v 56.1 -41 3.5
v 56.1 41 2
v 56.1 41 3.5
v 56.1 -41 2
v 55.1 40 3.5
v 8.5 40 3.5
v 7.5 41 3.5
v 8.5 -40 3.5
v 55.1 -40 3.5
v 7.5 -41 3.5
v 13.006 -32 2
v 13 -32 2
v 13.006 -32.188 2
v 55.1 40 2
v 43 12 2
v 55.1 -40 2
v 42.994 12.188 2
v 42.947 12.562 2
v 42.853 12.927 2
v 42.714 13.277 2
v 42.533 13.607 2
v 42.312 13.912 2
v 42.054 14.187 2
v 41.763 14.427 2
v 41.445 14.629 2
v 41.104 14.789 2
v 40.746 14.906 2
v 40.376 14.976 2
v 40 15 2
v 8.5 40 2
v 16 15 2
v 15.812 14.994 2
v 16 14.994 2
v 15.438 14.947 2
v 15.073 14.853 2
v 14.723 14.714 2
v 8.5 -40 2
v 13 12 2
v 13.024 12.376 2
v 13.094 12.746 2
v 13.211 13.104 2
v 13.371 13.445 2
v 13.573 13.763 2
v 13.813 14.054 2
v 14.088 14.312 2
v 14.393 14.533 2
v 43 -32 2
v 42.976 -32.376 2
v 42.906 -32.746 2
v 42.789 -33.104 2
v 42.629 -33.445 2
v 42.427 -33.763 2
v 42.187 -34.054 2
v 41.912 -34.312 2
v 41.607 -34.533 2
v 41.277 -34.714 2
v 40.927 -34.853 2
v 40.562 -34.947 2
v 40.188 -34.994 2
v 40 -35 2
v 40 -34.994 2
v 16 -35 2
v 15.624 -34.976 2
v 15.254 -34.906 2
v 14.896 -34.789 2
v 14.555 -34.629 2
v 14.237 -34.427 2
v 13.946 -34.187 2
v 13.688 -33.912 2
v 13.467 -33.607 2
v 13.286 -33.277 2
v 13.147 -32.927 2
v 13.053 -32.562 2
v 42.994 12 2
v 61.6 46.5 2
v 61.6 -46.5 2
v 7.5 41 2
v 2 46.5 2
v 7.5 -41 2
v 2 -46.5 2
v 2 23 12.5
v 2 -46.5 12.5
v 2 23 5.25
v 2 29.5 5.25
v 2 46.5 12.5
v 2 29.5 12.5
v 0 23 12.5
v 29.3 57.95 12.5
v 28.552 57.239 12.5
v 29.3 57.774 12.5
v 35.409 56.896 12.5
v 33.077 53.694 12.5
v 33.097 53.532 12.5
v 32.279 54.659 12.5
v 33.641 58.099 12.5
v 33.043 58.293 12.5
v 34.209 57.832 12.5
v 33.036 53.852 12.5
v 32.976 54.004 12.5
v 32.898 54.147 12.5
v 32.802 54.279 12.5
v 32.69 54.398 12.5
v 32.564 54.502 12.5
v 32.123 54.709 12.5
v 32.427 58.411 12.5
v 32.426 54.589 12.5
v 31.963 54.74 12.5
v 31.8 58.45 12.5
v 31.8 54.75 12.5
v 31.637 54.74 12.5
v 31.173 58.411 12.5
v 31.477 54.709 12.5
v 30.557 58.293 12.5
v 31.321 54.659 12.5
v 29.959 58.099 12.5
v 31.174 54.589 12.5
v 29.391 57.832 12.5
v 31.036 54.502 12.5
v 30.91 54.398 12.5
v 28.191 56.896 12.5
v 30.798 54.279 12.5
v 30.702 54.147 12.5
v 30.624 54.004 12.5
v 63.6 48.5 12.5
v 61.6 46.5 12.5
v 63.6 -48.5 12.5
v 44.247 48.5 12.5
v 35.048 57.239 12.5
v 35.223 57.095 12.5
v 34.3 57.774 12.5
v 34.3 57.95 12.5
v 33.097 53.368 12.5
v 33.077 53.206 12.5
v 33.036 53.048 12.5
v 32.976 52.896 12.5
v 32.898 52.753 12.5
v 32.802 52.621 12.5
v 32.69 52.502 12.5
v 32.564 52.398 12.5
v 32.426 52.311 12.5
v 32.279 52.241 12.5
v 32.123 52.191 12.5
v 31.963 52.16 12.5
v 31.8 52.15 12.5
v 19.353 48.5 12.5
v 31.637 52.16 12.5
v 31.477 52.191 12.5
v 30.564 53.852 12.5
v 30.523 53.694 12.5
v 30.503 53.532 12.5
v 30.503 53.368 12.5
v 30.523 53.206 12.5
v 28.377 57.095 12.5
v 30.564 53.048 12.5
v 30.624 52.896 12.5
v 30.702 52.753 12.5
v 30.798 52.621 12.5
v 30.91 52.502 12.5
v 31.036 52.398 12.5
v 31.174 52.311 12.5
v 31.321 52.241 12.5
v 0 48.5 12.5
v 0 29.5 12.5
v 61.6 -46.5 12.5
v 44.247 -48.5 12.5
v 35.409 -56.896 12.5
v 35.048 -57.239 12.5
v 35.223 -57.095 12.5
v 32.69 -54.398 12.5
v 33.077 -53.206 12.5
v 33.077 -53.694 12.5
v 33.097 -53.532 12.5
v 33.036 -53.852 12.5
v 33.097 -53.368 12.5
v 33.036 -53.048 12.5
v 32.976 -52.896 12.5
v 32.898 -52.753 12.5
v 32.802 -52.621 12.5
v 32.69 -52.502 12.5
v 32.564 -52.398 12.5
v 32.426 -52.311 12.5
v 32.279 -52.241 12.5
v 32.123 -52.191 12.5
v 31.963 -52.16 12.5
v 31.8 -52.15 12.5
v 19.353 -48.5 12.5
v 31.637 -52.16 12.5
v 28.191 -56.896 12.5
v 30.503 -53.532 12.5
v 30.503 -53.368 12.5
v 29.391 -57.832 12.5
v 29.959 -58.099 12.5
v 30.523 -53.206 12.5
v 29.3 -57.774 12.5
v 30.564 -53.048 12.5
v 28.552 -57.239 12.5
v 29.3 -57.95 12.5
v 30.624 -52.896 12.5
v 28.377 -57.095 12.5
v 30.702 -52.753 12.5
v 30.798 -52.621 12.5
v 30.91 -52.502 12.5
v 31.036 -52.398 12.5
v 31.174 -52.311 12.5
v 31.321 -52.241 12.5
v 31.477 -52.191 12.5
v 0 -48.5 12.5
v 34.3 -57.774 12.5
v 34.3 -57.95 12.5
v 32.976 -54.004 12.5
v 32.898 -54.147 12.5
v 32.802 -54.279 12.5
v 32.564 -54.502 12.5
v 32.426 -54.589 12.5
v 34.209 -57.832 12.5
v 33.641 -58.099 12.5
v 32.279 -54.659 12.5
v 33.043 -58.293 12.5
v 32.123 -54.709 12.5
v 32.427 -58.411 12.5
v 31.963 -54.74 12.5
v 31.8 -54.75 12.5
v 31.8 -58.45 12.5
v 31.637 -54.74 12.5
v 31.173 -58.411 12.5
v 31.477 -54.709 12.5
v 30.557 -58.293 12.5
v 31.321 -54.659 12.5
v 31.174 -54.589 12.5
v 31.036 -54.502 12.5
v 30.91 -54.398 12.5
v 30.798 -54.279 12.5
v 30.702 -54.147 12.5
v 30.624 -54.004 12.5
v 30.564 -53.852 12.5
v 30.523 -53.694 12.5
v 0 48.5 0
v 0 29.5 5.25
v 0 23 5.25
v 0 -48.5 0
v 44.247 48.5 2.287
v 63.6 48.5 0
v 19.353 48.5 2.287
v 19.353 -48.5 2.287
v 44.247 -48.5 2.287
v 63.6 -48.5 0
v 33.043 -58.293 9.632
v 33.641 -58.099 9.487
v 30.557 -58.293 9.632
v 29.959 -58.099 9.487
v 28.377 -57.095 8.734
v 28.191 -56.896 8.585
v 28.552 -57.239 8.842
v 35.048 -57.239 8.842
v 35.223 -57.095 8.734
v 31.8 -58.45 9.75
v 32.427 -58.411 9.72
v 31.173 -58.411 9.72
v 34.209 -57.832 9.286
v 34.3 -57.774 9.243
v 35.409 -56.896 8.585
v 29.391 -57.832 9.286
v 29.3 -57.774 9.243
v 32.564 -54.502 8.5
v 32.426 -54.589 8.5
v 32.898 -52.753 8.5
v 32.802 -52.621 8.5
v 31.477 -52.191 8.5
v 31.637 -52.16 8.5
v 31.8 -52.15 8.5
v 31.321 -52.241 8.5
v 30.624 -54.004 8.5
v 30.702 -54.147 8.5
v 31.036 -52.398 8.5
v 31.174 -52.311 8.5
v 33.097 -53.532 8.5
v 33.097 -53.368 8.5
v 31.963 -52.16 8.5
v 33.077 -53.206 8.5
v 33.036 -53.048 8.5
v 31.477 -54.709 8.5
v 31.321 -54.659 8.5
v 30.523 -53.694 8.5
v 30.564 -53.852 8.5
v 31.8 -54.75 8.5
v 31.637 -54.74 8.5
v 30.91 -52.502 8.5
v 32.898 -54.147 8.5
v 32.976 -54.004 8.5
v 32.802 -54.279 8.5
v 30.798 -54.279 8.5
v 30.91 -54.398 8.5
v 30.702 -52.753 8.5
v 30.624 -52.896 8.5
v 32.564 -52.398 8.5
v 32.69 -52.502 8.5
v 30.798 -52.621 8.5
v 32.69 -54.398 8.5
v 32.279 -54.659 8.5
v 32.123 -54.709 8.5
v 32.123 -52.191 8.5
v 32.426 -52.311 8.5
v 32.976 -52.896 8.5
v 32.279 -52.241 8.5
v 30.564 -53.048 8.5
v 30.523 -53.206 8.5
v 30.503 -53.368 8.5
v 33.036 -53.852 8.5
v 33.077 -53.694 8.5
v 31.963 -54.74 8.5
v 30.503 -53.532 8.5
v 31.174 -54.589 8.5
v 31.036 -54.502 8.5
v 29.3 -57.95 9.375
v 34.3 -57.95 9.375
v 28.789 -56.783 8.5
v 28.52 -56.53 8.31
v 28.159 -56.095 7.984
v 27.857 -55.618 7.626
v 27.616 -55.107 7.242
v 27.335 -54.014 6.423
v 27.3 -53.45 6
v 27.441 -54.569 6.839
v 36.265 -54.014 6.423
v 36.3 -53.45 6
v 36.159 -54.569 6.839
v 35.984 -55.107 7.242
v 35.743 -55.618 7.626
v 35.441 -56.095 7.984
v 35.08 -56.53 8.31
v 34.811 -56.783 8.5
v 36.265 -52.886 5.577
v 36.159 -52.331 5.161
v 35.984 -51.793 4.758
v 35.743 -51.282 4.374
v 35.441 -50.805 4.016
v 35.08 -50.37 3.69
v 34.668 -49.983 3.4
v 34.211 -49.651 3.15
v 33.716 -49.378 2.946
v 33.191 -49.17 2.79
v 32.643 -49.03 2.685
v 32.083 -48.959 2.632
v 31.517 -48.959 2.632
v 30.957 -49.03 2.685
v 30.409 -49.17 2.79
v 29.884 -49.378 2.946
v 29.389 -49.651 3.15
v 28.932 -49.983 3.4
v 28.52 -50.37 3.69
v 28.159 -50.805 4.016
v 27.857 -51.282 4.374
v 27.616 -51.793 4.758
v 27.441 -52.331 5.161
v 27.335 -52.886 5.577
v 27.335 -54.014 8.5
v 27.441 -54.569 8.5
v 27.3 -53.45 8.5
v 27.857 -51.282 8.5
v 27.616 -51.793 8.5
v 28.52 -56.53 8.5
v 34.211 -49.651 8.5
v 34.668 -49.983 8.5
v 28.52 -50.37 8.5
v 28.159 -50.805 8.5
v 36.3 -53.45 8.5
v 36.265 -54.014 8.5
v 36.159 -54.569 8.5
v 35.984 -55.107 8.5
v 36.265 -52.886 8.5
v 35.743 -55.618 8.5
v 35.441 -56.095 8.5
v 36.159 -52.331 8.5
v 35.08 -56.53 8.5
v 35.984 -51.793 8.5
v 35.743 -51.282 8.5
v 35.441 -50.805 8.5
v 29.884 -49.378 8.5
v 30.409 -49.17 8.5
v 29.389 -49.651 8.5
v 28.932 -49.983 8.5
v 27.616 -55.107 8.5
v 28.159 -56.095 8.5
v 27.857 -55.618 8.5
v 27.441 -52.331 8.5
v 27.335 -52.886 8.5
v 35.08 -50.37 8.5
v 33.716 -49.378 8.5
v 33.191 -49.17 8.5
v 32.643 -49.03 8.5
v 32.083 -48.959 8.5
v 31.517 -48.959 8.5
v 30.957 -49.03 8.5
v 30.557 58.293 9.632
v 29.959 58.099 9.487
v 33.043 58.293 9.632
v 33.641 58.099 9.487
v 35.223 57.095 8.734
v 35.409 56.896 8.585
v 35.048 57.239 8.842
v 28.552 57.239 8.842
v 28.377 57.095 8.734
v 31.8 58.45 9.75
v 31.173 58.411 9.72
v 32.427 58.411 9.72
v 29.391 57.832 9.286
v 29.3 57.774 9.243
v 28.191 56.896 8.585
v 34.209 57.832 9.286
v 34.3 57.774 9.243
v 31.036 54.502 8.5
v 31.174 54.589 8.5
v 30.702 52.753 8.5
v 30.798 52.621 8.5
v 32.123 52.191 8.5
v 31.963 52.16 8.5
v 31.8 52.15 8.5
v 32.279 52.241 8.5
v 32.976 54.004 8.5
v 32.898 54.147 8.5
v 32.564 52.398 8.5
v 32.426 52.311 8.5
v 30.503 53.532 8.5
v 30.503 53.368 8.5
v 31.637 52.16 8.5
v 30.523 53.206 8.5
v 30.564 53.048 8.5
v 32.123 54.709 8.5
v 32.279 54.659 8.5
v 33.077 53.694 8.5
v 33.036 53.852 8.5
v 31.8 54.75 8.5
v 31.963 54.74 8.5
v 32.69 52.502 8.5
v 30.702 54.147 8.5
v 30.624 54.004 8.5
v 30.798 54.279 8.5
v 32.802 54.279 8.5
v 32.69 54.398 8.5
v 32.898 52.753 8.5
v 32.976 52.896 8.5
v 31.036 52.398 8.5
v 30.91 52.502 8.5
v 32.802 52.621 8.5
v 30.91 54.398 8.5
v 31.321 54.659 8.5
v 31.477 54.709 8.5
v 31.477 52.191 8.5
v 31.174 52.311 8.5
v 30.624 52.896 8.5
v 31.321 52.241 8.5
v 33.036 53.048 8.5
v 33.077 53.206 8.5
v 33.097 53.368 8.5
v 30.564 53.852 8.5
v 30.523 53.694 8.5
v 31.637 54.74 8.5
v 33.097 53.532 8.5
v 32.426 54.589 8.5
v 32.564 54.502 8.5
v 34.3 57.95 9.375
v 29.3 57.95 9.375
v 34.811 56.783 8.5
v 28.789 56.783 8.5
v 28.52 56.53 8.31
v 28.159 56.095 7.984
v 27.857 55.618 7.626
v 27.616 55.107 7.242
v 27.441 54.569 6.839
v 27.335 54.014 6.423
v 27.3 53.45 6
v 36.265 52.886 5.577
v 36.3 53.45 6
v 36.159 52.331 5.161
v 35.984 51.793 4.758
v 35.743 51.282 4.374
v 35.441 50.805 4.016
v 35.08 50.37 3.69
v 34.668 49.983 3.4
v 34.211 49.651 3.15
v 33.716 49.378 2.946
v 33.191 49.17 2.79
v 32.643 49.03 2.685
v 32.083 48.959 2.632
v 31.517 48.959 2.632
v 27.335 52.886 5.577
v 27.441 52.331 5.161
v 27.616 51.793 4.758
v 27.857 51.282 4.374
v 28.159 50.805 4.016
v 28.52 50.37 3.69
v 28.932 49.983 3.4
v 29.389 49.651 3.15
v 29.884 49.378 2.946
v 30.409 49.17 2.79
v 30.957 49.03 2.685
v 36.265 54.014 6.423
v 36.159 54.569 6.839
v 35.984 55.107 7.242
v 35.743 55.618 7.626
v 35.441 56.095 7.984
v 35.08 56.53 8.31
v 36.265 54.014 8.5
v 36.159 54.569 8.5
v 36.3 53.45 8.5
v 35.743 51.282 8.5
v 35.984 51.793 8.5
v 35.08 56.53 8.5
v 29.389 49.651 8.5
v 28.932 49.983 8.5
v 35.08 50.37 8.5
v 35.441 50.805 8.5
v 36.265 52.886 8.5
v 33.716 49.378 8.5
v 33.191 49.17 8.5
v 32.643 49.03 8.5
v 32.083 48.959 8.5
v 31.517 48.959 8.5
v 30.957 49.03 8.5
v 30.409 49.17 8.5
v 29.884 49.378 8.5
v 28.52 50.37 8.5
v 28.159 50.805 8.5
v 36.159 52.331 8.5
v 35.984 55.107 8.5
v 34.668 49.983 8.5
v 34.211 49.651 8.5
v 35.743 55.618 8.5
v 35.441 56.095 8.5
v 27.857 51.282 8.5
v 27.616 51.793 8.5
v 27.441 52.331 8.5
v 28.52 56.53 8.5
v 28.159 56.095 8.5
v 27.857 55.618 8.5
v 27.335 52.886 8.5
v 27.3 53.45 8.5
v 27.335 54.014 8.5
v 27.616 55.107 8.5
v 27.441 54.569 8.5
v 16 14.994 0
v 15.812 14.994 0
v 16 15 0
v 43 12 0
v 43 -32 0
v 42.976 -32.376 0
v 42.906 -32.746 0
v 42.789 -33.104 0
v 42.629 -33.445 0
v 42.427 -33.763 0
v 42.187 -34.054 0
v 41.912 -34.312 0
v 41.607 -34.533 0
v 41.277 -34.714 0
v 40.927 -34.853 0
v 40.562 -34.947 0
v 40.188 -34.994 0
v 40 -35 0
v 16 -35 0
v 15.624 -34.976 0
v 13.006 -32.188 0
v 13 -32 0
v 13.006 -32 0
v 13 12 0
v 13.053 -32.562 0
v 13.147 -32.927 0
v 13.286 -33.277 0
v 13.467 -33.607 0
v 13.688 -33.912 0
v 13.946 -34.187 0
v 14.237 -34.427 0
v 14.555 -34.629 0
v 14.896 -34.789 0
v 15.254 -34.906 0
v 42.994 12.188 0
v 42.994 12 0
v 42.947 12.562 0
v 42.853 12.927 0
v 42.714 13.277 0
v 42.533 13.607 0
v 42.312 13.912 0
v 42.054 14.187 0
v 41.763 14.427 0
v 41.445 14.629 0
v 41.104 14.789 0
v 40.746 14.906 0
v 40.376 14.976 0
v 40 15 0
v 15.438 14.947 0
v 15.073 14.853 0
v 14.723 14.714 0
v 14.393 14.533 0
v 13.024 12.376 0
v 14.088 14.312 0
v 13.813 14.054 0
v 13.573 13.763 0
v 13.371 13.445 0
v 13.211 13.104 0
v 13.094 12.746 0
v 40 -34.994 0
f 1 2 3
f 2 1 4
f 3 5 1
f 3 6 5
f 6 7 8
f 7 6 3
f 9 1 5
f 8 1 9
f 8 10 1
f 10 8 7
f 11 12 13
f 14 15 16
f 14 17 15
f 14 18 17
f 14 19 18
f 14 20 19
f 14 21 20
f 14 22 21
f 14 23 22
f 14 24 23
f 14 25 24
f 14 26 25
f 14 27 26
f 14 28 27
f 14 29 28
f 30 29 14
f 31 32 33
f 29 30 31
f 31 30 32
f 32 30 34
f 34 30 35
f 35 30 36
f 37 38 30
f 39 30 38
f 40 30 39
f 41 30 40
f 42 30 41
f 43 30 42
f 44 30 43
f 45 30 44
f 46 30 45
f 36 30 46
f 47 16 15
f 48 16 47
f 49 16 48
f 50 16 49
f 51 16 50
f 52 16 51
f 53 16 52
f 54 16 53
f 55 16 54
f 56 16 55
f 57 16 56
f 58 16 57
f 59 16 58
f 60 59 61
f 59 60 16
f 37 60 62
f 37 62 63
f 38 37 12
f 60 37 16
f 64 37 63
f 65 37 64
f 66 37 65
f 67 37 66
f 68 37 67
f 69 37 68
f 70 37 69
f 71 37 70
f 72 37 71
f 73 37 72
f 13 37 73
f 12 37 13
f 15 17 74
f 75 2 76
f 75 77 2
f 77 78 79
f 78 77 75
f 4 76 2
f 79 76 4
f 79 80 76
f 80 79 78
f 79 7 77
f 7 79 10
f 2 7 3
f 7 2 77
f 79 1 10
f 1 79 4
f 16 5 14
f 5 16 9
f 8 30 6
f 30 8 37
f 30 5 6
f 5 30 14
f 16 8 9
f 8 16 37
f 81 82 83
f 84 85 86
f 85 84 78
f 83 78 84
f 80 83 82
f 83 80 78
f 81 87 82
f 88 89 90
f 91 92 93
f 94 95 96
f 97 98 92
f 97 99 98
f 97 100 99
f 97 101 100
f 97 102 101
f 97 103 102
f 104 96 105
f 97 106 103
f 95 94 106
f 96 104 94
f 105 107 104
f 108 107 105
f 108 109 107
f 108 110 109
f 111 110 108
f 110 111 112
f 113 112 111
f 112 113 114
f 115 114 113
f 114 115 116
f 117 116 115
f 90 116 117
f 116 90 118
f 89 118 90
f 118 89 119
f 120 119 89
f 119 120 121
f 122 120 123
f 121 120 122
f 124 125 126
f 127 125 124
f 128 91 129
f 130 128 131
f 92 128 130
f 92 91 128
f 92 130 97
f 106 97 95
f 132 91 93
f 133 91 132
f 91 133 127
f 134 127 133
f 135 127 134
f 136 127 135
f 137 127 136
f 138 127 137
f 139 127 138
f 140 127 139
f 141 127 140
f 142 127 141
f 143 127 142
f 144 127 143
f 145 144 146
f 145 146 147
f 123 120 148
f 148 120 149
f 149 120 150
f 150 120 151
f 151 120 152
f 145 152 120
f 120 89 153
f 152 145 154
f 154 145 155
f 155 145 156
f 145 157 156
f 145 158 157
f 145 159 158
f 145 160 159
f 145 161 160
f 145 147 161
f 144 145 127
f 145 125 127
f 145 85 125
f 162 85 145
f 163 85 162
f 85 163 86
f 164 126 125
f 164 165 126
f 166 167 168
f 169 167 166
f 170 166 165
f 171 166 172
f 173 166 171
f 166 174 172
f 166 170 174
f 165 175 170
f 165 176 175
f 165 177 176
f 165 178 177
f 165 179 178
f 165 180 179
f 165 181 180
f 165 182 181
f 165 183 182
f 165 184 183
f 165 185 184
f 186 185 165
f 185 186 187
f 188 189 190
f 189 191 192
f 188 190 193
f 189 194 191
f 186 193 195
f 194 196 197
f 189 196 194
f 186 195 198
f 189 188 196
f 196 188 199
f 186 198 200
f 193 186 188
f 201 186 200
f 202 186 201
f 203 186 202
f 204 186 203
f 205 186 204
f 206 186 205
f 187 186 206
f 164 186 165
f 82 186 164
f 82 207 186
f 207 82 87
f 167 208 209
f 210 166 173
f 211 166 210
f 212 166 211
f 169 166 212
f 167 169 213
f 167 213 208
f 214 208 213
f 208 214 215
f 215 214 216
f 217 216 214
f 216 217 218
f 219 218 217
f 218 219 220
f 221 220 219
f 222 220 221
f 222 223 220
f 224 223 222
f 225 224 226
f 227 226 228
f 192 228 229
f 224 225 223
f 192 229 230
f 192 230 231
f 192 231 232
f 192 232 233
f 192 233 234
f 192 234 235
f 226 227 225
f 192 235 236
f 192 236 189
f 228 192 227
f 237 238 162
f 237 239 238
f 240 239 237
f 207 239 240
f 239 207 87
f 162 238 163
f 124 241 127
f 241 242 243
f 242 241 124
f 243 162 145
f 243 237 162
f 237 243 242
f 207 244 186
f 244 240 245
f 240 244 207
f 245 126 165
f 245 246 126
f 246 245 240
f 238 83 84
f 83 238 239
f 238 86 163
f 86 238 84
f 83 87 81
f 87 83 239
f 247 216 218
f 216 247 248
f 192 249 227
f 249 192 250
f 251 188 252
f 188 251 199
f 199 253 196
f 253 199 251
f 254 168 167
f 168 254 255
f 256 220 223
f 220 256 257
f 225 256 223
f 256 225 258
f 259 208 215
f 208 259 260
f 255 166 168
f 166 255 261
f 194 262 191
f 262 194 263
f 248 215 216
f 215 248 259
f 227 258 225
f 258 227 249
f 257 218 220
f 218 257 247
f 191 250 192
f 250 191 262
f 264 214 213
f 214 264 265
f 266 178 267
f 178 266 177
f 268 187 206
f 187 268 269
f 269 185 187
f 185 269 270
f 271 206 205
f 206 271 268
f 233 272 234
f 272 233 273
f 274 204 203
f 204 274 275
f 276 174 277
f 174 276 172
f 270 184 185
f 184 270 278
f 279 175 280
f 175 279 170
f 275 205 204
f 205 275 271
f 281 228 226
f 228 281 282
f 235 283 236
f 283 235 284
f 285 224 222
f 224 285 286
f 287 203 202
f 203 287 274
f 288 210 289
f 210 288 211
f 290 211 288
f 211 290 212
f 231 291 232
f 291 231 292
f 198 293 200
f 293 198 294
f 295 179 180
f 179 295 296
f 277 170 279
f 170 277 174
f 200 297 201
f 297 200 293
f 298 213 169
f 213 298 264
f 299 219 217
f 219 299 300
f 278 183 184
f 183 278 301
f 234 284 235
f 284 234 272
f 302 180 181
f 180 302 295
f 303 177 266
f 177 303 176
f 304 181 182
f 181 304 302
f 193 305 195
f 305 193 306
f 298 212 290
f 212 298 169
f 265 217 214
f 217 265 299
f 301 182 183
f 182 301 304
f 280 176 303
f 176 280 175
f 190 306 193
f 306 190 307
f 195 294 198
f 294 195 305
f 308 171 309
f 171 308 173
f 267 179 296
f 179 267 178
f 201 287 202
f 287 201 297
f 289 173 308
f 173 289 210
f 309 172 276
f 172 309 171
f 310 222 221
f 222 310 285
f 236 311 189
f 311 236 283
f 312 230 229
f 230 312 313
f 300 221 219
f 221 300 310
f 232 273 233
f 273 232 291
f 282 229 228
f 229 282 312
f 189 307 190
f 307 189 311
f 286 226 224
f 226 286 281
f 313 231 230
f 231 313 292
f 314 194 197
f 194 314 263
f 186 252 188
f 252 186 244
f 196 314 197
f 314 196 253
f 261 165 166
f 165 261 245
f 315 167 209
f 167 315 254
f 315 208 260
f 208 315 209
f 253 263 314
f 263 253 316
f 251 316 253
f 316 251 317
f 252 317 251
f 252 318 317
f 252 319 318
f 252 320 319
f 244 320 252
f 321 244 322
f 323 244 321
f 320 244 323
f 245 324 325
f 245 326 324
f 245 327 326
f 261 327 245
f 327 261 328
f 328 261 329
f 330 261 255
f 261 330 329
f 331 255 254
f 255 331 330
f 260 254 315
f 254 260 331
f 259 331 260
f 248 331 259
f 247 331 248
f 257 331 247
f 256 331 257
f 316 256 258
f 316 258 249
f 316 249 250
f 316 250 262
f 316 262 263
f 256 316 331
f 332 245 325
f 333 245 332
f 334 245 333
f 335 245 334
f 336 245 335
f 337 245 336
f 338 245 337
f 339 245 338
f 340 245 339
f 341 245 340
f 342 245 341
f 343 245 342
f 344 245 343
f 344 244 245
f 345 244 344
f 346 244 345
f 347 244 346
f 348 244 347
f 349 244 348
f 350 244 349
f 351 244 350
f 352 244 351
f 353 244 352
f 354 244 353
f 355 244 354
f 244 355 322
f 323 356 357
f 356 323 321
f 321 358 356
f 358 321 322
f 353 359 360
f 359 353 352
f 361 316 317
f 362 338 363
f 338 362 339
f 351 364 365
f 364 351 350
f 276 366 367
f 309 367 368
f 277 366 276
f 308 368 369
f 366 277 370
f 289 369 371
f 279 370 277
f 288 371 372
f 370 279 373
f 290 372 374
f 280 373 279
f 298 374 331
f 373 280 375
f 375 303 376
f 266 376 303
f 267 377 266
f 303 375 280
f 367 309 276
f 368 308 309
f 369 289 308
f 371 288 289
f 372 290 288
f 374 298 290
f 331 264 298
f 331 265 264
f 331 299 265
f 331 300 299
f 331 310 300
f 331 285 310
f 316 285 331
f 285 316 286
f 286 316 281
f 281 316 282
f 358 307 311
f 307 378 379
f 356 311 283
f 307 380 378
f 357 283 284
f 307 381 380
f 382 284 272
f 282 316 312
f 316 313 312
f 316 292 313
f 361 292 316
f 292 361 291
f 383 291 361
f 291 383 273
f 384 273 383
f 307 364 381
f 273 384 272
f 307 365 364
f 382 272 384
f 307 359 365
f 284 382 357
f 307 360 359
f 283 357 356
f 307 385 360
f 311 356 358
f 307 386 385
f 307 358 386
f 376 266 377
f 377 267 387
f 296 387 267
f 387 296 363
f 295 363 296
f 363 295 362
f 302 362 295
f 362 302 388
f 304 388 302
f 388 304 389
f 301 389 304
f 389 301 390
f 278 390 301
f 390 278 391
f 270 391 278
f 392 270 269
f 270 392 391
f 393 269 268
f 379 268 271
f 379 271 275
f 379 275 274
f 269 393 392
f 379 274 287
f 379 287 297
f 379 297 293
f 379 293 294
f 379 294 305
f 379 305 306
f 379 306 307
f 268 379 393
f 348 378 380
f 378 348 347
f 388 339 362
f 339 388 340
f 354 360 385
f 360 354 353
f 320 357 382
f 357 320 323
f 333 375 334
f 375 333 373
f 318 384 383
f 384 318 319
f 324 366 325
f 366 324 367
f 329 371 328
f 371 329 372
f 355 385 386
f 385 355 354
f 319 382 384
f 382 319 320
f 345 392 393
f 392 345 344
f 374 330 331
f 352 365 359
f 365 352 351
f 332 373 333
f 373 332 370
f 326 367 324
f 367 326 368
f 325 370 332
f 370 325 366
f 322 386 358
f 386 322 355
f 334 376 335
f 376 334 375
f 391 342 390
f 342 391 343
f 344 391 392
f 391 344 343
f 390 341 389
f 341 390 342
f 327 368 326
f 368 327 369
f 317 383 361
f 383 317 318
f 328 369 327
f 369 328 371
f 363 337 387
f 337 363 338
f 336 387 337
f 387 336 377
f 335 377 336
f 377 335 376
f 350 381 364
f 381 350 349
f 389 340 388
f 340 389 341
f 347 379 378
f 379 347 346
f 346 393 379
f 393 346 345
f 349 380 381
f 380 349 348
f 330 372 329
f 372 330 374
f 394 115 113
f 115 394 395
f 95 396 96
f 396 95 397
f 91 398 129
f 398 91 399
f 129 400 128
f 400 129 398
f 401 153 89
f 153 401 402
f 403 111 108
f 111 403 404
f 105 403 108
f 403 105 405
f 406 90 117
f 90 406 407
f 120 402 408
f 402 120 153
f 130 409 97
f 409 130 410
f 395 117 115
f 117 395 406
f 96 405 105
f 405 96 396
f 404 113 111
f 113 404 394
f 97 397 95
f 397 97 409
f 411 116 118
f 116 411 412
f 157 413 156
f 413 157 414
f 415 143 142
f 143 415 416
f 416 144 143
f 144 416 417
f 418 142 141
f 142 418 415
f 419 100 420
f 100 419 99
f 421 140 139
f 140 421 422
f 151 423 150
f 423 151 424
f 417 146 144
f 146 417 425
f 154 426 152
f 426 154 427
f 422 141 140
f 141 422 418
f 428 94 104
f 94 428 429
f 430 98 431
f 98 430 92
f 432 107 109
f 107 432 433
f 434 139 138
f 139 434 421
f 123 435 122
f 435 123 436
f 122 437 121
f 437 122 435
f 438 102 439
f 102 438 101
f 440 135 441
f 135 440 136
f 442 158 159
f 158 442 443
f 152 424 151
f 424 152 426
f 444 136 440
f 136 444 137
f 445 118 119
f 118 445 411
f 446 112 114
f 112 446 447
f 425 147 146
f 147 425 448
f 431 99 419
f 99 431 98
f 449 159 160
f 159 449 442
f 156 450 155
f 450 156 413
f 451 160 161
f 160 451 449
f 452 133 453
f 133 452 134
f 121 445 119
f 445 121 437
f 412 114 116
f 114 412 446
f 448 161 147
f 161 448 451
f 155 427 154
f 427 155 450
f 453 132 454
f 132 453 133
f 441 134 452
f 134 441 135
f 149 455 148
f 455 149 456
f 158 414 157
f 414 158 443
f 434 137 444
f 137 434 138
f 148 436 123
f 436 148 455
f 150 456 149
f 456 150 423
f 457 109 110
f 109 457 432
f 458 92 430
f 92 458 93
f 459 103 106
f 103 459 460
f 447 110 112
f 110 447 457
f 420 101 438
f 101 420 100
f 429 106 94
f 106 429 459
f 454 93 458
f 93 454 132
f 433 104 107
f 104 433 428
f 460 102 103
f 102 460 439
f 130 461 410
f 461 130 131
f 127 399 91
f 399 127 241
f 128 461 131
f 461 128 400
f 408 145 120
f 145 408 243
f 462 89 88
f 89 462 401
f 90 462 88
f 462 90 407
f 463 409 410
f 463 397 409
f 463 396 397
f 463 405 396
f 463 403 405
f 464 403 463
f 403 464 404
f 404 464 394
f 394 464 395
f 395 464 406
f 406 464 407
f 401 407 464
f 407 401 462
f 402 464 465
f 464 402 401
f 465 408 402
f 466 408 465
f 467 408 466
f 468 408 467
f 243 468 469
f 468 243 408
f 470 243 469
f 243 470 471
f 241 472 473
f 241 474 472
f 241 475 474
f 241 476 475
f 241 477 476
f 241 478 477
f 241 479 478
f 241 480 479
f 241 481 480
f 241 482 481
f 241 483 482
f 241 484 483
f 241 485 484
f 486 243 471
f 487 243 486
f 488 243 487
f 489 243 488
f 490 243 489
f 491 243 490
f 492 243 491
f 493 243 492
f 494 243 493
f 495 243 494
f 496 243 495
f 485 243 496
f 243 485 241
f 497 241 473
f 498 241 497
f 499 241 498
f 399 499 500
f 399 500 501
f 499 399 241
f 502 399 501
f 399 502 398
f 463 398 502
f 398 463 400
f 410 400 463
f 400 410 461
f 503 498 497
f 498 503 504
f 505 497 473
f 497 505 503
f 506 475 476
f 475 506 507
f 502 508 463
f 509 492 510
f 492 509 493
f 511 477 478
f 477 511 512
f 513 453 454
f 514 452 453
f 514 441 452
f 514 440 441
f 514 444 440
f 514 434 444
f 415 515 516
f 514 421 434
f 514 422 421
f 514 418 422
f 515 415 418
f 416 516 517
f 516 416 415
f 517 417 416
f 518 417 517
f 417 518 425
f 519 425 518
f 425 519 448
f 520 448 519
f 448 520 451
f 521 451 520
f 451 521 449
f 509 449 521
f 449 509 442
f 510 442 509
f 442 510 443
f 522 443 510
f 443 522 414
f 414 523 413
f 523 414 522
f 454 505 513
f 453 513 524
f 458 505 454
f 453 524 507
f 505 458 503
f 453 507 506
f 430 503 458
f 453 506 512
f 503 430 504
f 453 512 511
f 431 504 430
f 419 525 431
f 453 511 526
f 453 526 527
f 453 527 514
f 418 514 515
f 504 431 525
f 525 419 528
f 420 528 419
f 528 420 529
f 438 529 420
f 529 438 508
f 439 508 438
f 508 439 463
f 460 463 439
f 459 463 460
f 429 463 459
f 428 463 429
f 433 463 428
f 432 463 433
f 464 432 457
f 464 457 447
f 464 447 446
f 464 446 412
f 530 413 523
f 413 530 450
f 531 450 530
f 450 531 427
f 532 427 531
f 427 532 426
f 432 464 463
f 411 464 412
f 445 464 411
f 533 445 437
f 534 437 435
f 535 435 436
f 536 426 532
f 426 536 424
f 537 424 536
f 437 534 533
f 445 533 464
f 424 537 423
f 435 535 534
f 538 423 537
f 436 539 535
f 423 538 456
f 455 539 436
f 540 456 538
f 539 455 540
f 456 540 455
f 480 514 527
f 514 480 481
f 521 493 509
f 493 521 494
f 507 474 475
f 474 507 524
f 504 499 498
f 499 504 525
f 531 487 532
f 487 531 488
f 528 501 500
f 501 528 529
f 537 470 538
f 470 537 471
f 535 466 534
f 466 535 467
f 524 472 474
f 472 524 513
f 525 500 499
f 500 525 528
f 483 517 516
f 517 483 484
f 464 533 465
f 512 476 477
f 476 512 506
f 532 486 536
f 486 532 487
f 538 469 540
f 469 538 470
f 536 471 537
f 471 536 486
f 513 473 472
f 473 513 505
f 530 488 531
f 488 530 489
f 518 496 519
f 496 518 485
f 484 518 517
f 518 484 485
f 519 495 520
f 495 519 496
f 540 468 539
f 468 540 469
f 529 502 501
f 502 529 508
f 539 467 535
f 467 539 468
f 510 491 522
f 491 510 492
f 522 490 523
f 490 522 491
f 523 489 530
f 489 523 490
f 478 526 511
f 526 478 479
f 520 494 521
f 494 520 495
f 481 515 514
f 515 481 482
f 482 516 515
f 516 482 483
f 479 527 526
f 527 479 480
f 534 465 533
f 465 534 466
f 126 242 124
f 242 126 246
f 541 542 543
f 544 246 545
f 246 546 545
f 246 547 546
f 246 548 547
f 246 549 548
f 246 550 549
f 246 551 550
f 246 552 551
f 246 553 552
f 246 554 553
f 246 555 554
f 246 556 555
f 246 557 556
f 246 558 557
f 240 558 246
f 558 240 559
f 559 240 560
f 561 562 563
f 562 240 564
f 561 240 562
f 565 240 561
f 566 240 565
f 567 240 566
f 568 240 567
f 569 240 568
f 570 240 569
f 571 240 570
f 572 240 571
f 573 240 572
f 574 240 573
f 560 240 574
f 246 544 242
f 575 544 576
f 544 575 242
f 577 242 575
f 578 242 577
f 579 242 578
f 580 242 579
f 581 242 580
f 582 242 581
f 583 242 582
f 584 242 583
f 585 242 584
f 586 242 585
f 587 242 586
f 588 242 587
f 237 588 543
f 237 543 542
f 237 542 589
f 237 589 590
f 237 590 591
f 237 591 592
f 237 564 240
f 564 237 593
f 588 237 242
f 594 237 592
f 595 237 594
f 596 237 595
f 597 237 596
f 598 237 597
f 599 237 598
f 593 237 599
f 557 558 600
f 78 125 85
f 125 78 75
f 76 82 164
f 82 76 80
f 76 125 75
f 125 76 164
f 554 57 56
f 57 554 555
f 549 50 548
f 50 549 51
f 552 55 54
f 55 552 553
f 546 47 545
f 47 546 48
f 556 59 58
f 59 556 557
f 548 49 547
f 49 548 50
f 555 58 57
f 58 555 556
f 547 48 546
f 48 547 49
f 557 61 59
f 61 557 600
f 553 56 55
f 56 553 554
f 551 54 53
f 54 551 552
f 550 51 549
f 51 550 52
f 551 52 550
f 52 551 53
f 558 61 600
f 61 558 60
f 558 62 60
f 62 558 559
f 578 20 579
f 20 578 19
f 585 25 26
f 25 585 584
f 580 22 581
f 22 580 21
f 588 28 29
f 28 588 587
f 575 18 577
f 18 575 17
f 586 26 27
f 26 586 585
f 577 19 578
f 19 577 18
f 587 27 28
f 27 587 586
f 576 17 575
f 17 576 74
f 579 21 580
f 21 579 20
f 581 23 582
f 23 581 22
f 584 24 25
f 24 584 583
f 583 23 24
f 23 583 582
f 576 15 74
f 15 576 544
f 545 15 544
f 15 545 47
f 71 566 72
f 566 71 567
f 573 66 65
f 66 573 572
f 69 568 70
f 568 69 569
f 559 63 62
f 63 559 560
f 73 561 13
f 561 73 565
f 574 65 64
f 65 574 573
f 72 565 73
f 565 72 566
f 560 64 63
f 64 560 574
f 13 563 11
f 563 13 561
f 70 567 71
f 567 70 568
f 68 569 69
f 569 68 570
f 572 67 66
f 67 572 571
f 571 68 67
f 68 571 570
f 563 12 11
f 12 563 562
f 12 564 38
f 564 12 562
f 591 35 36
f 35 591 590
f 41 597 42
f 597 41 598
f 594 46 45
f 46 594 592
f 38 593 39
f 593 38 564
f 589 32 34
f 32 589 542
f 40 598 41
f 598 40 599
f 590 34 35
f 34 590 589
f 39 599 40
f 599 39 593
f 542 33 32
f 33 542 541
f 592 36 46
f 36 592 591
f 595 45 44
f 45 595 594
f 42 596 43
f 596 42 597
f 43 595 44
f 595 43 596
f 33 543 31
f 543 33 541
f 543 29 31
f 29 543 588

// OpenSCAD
// file: ../library_deh/deh_shapes.scad
/*  ***** tubedeh *****
d1 = outside diameter
d2 = inside diameter
ht = height
reference is center of tube, bottom
*/
module tubedeh(d1,d2,ht)
{
   difference()
   {
     cylinder(d = d1, h = ht, center = false);
     cylinder(d = d2, h = ht + .001, center = false);
   }
}
/* ***** rounded_bar *****
 * rectangular bar with rounded end
bar with one end rounded
d = diameter of rounded end, and width of bar
l = length of bar from center of rounded end to end
h = thickness (height) of bar
reference is center of rounded end, bottom
*/
module rounded_bar(d, l, h)
{
    // Rounded end
    cylinder(d = d, h = h, center = false);
    // Bar
    translate([0, -d/2, 0])
       cube([l, d, h],false);
}
/* ***** eyebar *****
 * rounded bar with hole in rounded end
d1 = outside diameter of rounded end, and width of bar
d2 = diameter of hole in end of bar
*/
module eye_bar(d1, d2, len, ht)
{
   difference()
   {   
      rounded_bar(d1,len,ht);
      cylinder(d = d2, h = ht + .001, center = false);
   }
}
/* ***** rounded_rectangle ******
rounded_rectangle(l,w,h,rad);
l = length (x direction)
w = width (y direction)
h = thickness (z direction)
rad = radius of corners
reference = center of rectangle x,y, bottom
*/
module rounded_rectangle(l,w,h,rad)
{
  translate([-(l-rad)/2,-(w-rad)/2,0])
  {
    // Four rounded edges
    translate([0,0,0])
      rounded_bar(rad*2,l-rad,h);
    translate([l-rad,0,0])
      rotate([0,0,90])
      rounded_bar(rad*2,w-rad,h);
    translate([l-rad,w-rad,0])
      rotate([0,0,180])
      rounded_bar(rad*2,l-rad,h);
    translate([0,w-rad,0])
      rotate([0,0,-90])
      rounded_bar(rad*2,w-rad,h);
    // Fill in center
    translate([0,0,0])
      cube([l-rad + .01,w-rad + .01,h],false);
  }
}

/* ***** wedge *****
l = length
w = width
h = height/thickness
*/
 module wedge(l, w, h)
 {
   polyhedron(
      points=[[0,0,0], [l,0,0], [l,w,0], [0,w,0], [0,w,h], [l,w,h]],
       faces=[[0,1,2,3],[5,4,3,2],[0,4,5,1],[0,3,4],[5,2,1]] );
 }
/* ***** rounded_triangle *****
 * l1 = side 1
 * l2 = side 2
 * l3 = side 3
 * h  = height/thickness
 * rad = radius of rounded corners
 */
module rounded_triangle(l1,l2,l3,h,rad)
{
  // Compute rotation angles
  al3 = acos((l1*l1 + l2*l2 - l3*l3)/(2 * l1 * l2));
  al1 = acos((l2*l2 + l3*l3 - l1*l1)/(2 * l2 * l3));
  al2 = acos((l3*l3 + l1*l1 - l2*l2)/(2 * l3 * l1));
  // Setup bars for edges
  translate([0,0,0])
    rotate([0,0,0])
      rounded_bar(rad,l3,h);
  translate([l3,0,0])
    rotate([0,0,180-al2])
      rounded_bar(rad,l1,h);
  rotate([0,0,al1])
    translate([l2,0,0])
      rotate([0,0,180])
        rounded_bar(rad,l2,h);
  // Fill in center
    triangle(l1,l2,l3,h);
}
/* ***** triangle *****
 * l1 = side 1
 * l2 = side 2
 * l3 = side 3
 * h  = height/thickness
 */
module triangle(l1,l2,l3,h)
{
  // Compute rotation angle
  al1 = acos((l2*l2 + l3*l3 - l1*l1)/(2 * l2 * l3));
  
  linear_extrude(height = h)
  polygon(points = [[0,0],[l3,0],[l2*cos(al1),l2*sin(al1)]]);
}
/* ***** chamfered hole *****
 * Punch hole with chamfer on one end
 * d1 = main hole diameter
 * d2 = hole diameter at chamfered end
 * ht1 = height of whole hole
 * ht2 = depth of  chamfer
*/
module chamfered_hole(d1,d2,ht1,ht2)
{
   rotate_extrude(convexity = 10)
     polygon(points = [[0,0],[d1/2,0],[d1/2,ht1-ht2],[d2/2,ht1],[0,ht1]]);

}

/* ***** fillet *****
 * r = radius of fillet
 * l = length of fillet
 fillet (r,l);
*/
module fillet(r,l)
{
   difference()
   {
     union()
     {
       cube([2*r,2*r,l]);
     }
     union()
     {
       translate ([r,r,0])
           cylinder(d = 2*r, h = l, center = false);
       translate([r,0,0])
           cube([r,2*r,l],center = false);
       translate([0,r,0])
           cube([2*r,r,l],center = false);
     }
   }
}
// main file
/* File: cwV_cover.scad
 * Cover for PC board box in codewheel_fixture
 * Author: deh
 * Latest edit: 20170408
 */

include <../library_deh/deh_shapes.scad>

 $fn=50;

// PC board dimensions
pc_slop = 4;
pcwid = 49.6 + pc_slop;	// Width of PC board
pclen = 83.0 + pc_slop;	// Length of PC board
pcthick = 1.7;	// Thickness of board

module wedge(l, w, h)
 {
   polyhedron(
      points=[[0,0,0], [l,0,0], [l,w,0], [0,w,0], [0,w,h], [l,w,h]],
       faces=[[0,1,2,3],[5,4,3,2],[0,4,5,1],[0,3,4],[5,2,1]] );
 }

module tube(d1,d2,ht)
{
   difference()
   {
     cylinder(d = d1, h = ht, center = false);
     cylinder(d = d2, h = ht + .001, center = false);
   }
}
module mag_mnt_bar(d1, d2, len, ht)
{
   difference()
   {
     union()
     {
        cylinder(d = d1, h = ht, center = false);
        translate([-len, -d1/2, 0])
           cube([len, d1, ht]);
     }
       cylinder(d = d2, h = ht + .001, center = false);
   }
    
}
// Tabs for holding pc board cover down
bt_wid = 10;
bt_hole_dia = 3.2;  // Screw hold dia
bt_thick = 3;	// Thickness
bt_len = 10;	// Length
bt_w_ht = 6;	// Stiffner height

module brd_tab()
{
   mag_mnt_bar(bt_wid, bt_hole_dia, bt_len - shell_wall, bt_thick);
   translate([0 ,(bt_wid/2 - bt_thick),bt_thick])
      rotate([0,0,90])
         wedge(bt_thick,bt_len-3,bt_w_ht);
   translate([0 ,-(bt_wid/2),bt_thick])
      rotate([0,0,90])
         wedge(bt_thick,bt_len-3,bt_w_ht);
}
base_thick 	= 2.0;	// Thickness of base
base_rad	= 10;	// Radius around mags

shell_wall = 2;		// Cover wall thickness
shell_ht = 10.5;	;	// Cover side height
shell_gap = 1;		// Cover gap between enclosure walls and cover

shell_x = pcwid + 4*shell_wall + 2*shell_gap;
shell_y = pclen + 4*shell_wall + 2*shell_gap;

tab_ofs = shell_wall + shell_gap;

shell_iofs = 5;
shell_ix = pcwid-shell_iofs;  // Inner ridge location
shell_iy = pclen-shell_iofs;
shell_ih = 1.5;	// Height of inner ridge
shell_iw = 1; 	// Width of inner ridge
shell_iix = shell_ix - 2*shell_iw;
shell_iiy = shell_iy - 2*shell_iw;
shell_or_x1 = shell_gap + 2*shell_wall + shell_iofs/2;
shell_or_x2 = shell_or_x1 + shell_iw;

cc_wid = 6.5;		// Telephone type cable width
cc_thick = 2.25;	// Thickness
cc_frm_top = 3;		// Offset from top of side
cc_frm_side = 19;	// Offset from side
cc_sense_dia = 4;	// Sensor cable dia
cc_z = cc_thick + cc_frm_top;



module pc_shell()
{

   // Cover top
   translate([0,-shell_y/2,0])
   cube([shell_x,shell_y,base_thick],false);

   // Ridge for O-ring type sealing
   difference()
   {
      translate([shell_or_x1,-shell_iy/2,base_thick])
         cube([shell_ix,shell_iy,shell_ih],false);
      translate([shell_or_x2,-shell_iiy/2,base_thick])
         cube([shell_iix,shell_iiy,shell_ih],false);

   }

   // Wall: +y end with cable cutout
   translate([0, shell_y/2 - shell_wall,base_thick])
     cube([shell_x, shell_wall, shell_ht]);

   // Wall: -y end 
   translate([0, -shell_y/2,base_thick])
     cube([shell_x, shell_wall, shell_ht]);

   // Wall: x=0 side
   difference()
   {
      translate([0, -shell_y/2, base_thick])
        cube([shell_wall, shell_y, shell_ht]);
    // Cable cutout
      translate([-1, shell_y/2 - cc_frm_side - cc_wid , shell_ht - cc_z])
        cube([shell_wall + 2,cc_wid, 10],false);
   }

   // Wall: +x side
      translate([shell_x - shell_wall, -shell_y/2, base_thick])
        cube([shell_wall, shell_y, shell_ht]);
/* 
   // Tabs for mounting top cover
   translate([shell_x/2,-(shell_y/2 + bt_len - tab_ofs),shell_ht+1.5])
     rotate([0,180,90])
        brd_tab();
   translate([shell_x/2,(shell_y/2 + bt_len - tab_ofs),shell_ht+1.5])
     rotate([0,180,-90])
        brd_tab();
*/
   translate([shell_x/2,-(shell_y/2 + cm_len - 0.05),0])
     rotate([0,0,180])
	cover_mnt_tab();

   translate([shell_x/2, (shell_y/2 + cm_len - 0.05),0])
     rotate([0,0,0])
	cover_mnt_tab();

}
module rounded_bar_end(l, w, h)
{
        cylinder(d = w, h = h, center = false);
        translate([-l, -w/2, 0])
           cube([l, w, h],false);
}
module rounded_rectangle(lo,wo,h,rad)
{
 translate([-rad/2,rad/2,0])
 {
  l = lo - rad; w = wo - rad;
  lr = l - 2*rad; wr = w - 2*rad;
   translate([-l,0,0])
     cube([l,w,h],false);

   ww = w; ll = l;
   translate([0,0,0])
     rounded_bar_end(ll,rad,h);
   translate([0,ww,0])
     rotate([0,0,90])
        rounded_bar_end(ww,rad,h);
   translate([-ll,0,0])
     rotate([0,0,-90])
        rounded_bar_end(ww,rad,h);
   translate([-ll,ww,0])
     rotate([0,0,180])
        rounded_bar_end(ll,rad,h);
 }
}
// Window 
module window()
{
  translate([43,-35,0])
     rounded_rectangle(30,50, base_thick+3,6);    

//  translate([15,-35,0])
//         cube([30,50,base_thick+3],false);    

//translate([-50,0,0])
//     rounded_rectangle(30,15, base_thick+3, 3);    
}

// Tabs for holding pc board cover down

 cm_od = 10;	// Diameter of cover mounting post
 cm_len = cm_od/2 + 0;
 cm_id = 2.6;	// Self-tapping screw hole diameter
 cm_wg = 5;	// Bottom wedge	
 cm_screw_head_dia = 9; // Screw head/washer diameter
 cm_recess = 8.5; 
cov_ofs = 0;  // Tab top distance below top edge of board

module cover_mnt_tab()
{
  difference()
  {
    union()
    {
      rotate([0,0,-90])
        eye_bar(cm_od,cm_id,cm_len,shell_ht + base_thick);

      translate([cm_len+(cm_od*(3/4)),-cm_len,shell_ht + base_thick])
        rotate([-90,0,0])
          rotate([0,0,90])
            wedge(shell_ht + base_thick,cm_len+cm_od/2,cm_len+cm_od/2-0.5);

      translate([-(cm_len + (cm_od*(3/4))),-cm_len,0])
        rotate([0,0,-90])
          rotate([0,-90,0])
            wedge(shell_ht + base_thick,cm_len+cm_od/2,cm_len+cm_od/2-0.5);
    }
    union()
    {
      translate([-cm_od/2-20,-cm_od/2-3,0])
        wedge(cm_od+80,cm_od+10,cm_od/2+10);

      translate([0,0,0])
       cylinder(d=cm_screw_head_dia, h = cm_recess, center=false);
    }
  }
}

module total()
{
   difference()
   {
      pc_shell();
        window();
   }
}
total();
